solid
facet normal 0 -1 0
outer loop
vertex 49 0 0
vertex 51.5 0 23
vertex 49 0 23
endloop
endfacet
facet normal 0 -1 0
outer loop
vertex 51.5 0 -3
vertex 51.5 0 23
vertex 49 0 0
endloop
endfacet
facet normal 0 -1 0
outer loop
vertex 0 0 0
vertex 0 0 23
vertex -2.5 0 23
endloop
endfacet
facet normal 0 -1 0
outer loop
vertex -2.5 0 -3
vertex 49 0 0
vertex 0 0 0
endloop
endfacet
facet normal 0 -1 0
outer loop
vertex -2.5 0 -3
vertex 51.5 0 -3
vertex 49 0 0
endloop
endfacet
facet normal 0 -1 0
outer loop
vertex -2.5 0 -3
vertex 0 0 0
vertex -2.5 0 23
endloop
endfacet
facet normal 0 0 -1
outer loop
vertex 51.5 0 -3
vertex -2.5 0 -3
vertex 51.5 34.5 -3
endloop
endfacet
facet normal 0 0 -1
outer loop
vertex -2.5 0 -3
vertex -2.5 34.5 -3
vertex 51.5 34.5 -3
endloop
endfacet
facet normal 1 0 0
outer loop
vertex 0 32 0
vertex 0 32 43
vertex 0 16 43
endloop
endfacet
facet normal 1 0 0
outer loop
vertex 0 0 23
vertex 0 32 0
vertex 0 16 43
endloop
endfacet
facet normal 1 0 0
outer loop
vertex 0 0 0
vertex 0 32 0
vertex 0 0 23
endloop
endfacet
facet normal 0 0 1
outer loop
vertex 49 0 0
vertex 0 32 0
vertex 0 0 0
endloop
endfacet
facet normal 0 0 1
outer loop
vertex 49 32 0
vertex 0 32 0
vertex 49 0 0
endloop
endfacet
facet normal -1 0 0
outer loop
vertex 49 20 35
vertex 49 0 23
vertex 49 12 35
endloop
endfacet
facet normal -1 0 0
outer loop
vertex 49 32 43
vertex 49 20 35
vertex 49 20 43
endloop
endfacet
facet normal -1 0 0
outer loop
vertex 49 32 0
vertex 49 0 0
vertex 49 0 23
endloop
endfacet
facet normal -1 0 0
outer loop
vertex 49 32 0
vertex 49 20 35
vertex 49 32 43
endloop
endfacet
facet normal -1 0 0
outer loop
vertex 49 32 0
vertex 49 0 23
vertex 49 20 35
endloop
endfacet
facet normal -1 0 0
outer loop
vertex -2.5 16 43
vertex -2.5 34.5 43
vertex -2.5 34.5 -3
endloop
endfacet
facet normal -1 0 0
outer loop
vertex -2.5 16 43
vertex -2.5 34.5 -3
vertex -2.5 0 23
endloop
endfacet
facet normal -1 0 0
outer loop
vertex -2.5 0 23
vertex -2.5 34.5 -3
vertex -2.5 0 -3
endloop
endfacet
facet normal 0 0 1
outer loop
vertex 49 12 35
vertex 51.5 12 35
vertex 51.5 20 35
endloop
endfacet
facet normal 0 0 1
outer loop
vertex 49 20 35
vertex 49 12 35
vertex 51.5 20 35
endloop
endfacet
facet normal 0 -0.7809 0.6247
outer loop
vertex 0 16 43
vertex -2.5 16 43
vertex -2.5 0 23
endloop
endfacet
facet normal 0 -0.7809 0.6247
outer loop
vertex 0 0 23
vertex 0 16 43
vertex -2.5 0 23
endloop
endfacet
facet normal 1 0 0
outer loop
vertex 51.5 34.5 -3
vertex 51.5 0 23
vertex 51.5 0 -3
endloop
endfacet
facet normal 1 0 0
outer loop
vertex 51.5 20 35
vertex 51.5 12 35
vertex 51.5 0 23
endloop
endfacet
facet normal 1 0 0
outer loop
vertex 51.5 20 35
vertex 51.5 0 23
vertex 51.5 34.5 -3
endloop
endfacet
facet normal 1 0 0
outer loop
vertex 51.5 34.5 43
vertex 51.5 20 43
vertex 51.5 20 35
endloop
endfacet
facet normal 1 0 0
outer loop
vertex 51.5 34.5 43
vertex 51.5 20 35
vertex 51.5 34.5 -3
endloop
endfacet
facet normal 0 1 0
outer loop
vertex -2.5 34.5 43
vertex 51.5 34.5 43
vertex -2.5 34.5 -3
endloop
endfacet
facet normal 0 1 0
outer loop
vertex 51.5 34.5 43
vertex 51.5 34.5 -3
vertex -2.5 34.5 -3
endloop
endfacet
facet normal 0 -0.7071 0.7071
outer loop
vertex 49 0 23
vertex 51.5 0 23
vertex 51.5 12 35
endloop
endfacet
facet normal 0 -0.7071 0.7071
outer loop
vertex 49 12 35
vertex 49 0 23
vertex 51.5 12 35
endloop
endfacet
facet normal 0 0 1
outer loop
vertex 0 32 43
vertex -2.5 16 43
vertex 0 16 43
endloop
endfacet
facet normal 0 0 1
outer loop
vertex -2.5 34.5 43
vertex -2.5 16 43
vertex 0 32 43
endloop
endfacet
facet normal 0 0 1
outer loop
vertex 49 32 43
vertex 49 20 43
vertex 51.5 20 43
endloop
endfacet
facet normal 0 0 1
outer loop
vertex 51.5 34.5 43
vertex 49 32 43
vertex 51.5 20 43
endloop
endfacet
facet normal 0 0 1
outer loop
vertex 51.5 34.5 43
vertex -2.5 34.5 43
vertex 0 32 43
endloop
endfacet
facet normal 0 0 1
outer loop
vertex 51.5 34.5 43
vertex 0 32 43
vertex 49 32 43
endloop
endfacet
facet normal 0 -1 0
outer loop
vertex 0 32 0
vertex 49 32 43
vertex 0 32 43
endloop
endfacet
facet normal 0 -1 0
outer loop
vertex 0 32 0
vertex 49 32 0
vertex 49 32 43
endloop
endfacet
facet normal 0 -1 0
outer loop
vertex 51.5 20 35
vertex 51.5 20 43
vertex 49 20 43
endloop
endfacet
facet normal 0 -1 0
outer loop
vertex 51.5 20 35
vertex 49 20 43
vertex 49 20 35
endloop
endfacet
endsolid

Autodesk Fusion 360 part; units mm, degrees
sketch "Sketch1" plane through (0, 0, 0) normal (0, 0, 1) x (1, 0, 0)
  line L0 (0, 0) -> (49, 0)
  line L1 (49, 0) -> (49, 32)
  line L2 (49, 32) -> (0, 32)
  line L3 (0, 32) -> (0, 0)
  line L4 (0, 0) -> (-2.5, 0)
  line L5 (-2.5, 0) -> (51.5, 0)
  line L6 (51.5, 0) -> (51.5, 34.5)
  line L7 (51.5, 34.5) -> (-2.5, 34.5)
  line L8 (-2.5, 34.5) -> (-2.5, 0)
  dimension "d1" = 49
  dimension "d2" = 32
  dimension "d3" = 2.5
  dimension "d4" = 34.5
  dimension "d5" = 54
extrude "Extrude1" add sketch "Sketch1" against normal blind 3
sketch "Sketch2" plane through (0, 0, 0) normal (0, 1, 0) x (1, 0, 0)
extrude "Extrude2" add sketch "Sketch1" along normal blind 43 contours L1 L2 L3 L4 L5 L6 L7 L8
sketch "Sketch3" plane through (51.5, 0, 0) normal (1, 0, 0) x (0, 1, 0)
  line L0 (0, 43) -> (0, -3)
  line L1 (0, -3) -> (34.5, -3)
  line L2 (34.5, -3) -> (34.5, 43)
  line L3 (34.5, 43) -> (0, 43)
  line L4 (34.5, 43) -> (32, 43)
  line L5 (32, 43) -> (0, 43)
  line L6 (0, 43) -> (16, 43)
  line L7 (16, 43) -> (12, 43)
  line L8 (12, 43) -> (12, 35)
  line L9 (12, 35) -> (16, 35)
  line L10 (16, 35) -> (16, 43)
  line L11 (16, 43) -> (20, 43)
  line L12 (20, 43) -> (20, 35)
  line L13 (20, 35) -> (16, 35)
  line L14 (16, 35) -> (16, 43)
  point P0 (32, 43)
  point P1 (32, 43)
  dimension "d10" = 4
  dimension "d11" = 8
  dimension "d12" = 8
extrude "Extrude3" cut sketch "Sketch3" against normal blind 10 contours L3 L5 L6 L7 L8 L9 L10 L14 | L3 L5 L10 L11 L12 L13 L14
sketch "Sketch4" plane through (51.5, 0, 0) normal (1, 0, 0) x (0, 1, 0)
  line L0 (20, 43) -> (20, 35)
  line L1 (20, 35) -> (12, 35)
  line L2 (12, 35) -> (12, 43)
  line L3 (12, 43) -> (0, 43)
  line L4 (0, 43) -> (0, -3)
  line L5 (0, -3) -> (34.5, -3)
  line L6 (34.5, -3) -> (34.5, 43)
  line L7 (34.5, 43) -> (20, 43)
  line L8 (0, 43) -> (0, 23)
  line L9 (0, 23) -> (12, 35)
  dimension "d15" = 20
extrude "Extrude4" cut sketch "Sketch4" against normal blind 5 contours L2 L3 L4 L8 L9
sketch "Sketch5" plane through (-2.5, 0, 0) normal (-1, 0, 0) x (0, -1, 0)
  line L0 (-34.5, 43) -> (-34.5, -3)
  line L1 (-34.5, -3) -> (0, -3)
  line L2 (0, -3) -> (0, 43)
  line L3 (0, 43) -> (-34.5, 43)
  line L4 (0, 43) -> (-16, 43)
  line L5 (0, 43) -> (0, 23)
  line L6 (-16, 43) -> (0, 23)
  dimension "d18" = 16
  dimension "d19" = 20
extrude "Extrude5" cut sketch "Sketch5" against normal blind 10 contours L2 L3 L4 L5 L6
